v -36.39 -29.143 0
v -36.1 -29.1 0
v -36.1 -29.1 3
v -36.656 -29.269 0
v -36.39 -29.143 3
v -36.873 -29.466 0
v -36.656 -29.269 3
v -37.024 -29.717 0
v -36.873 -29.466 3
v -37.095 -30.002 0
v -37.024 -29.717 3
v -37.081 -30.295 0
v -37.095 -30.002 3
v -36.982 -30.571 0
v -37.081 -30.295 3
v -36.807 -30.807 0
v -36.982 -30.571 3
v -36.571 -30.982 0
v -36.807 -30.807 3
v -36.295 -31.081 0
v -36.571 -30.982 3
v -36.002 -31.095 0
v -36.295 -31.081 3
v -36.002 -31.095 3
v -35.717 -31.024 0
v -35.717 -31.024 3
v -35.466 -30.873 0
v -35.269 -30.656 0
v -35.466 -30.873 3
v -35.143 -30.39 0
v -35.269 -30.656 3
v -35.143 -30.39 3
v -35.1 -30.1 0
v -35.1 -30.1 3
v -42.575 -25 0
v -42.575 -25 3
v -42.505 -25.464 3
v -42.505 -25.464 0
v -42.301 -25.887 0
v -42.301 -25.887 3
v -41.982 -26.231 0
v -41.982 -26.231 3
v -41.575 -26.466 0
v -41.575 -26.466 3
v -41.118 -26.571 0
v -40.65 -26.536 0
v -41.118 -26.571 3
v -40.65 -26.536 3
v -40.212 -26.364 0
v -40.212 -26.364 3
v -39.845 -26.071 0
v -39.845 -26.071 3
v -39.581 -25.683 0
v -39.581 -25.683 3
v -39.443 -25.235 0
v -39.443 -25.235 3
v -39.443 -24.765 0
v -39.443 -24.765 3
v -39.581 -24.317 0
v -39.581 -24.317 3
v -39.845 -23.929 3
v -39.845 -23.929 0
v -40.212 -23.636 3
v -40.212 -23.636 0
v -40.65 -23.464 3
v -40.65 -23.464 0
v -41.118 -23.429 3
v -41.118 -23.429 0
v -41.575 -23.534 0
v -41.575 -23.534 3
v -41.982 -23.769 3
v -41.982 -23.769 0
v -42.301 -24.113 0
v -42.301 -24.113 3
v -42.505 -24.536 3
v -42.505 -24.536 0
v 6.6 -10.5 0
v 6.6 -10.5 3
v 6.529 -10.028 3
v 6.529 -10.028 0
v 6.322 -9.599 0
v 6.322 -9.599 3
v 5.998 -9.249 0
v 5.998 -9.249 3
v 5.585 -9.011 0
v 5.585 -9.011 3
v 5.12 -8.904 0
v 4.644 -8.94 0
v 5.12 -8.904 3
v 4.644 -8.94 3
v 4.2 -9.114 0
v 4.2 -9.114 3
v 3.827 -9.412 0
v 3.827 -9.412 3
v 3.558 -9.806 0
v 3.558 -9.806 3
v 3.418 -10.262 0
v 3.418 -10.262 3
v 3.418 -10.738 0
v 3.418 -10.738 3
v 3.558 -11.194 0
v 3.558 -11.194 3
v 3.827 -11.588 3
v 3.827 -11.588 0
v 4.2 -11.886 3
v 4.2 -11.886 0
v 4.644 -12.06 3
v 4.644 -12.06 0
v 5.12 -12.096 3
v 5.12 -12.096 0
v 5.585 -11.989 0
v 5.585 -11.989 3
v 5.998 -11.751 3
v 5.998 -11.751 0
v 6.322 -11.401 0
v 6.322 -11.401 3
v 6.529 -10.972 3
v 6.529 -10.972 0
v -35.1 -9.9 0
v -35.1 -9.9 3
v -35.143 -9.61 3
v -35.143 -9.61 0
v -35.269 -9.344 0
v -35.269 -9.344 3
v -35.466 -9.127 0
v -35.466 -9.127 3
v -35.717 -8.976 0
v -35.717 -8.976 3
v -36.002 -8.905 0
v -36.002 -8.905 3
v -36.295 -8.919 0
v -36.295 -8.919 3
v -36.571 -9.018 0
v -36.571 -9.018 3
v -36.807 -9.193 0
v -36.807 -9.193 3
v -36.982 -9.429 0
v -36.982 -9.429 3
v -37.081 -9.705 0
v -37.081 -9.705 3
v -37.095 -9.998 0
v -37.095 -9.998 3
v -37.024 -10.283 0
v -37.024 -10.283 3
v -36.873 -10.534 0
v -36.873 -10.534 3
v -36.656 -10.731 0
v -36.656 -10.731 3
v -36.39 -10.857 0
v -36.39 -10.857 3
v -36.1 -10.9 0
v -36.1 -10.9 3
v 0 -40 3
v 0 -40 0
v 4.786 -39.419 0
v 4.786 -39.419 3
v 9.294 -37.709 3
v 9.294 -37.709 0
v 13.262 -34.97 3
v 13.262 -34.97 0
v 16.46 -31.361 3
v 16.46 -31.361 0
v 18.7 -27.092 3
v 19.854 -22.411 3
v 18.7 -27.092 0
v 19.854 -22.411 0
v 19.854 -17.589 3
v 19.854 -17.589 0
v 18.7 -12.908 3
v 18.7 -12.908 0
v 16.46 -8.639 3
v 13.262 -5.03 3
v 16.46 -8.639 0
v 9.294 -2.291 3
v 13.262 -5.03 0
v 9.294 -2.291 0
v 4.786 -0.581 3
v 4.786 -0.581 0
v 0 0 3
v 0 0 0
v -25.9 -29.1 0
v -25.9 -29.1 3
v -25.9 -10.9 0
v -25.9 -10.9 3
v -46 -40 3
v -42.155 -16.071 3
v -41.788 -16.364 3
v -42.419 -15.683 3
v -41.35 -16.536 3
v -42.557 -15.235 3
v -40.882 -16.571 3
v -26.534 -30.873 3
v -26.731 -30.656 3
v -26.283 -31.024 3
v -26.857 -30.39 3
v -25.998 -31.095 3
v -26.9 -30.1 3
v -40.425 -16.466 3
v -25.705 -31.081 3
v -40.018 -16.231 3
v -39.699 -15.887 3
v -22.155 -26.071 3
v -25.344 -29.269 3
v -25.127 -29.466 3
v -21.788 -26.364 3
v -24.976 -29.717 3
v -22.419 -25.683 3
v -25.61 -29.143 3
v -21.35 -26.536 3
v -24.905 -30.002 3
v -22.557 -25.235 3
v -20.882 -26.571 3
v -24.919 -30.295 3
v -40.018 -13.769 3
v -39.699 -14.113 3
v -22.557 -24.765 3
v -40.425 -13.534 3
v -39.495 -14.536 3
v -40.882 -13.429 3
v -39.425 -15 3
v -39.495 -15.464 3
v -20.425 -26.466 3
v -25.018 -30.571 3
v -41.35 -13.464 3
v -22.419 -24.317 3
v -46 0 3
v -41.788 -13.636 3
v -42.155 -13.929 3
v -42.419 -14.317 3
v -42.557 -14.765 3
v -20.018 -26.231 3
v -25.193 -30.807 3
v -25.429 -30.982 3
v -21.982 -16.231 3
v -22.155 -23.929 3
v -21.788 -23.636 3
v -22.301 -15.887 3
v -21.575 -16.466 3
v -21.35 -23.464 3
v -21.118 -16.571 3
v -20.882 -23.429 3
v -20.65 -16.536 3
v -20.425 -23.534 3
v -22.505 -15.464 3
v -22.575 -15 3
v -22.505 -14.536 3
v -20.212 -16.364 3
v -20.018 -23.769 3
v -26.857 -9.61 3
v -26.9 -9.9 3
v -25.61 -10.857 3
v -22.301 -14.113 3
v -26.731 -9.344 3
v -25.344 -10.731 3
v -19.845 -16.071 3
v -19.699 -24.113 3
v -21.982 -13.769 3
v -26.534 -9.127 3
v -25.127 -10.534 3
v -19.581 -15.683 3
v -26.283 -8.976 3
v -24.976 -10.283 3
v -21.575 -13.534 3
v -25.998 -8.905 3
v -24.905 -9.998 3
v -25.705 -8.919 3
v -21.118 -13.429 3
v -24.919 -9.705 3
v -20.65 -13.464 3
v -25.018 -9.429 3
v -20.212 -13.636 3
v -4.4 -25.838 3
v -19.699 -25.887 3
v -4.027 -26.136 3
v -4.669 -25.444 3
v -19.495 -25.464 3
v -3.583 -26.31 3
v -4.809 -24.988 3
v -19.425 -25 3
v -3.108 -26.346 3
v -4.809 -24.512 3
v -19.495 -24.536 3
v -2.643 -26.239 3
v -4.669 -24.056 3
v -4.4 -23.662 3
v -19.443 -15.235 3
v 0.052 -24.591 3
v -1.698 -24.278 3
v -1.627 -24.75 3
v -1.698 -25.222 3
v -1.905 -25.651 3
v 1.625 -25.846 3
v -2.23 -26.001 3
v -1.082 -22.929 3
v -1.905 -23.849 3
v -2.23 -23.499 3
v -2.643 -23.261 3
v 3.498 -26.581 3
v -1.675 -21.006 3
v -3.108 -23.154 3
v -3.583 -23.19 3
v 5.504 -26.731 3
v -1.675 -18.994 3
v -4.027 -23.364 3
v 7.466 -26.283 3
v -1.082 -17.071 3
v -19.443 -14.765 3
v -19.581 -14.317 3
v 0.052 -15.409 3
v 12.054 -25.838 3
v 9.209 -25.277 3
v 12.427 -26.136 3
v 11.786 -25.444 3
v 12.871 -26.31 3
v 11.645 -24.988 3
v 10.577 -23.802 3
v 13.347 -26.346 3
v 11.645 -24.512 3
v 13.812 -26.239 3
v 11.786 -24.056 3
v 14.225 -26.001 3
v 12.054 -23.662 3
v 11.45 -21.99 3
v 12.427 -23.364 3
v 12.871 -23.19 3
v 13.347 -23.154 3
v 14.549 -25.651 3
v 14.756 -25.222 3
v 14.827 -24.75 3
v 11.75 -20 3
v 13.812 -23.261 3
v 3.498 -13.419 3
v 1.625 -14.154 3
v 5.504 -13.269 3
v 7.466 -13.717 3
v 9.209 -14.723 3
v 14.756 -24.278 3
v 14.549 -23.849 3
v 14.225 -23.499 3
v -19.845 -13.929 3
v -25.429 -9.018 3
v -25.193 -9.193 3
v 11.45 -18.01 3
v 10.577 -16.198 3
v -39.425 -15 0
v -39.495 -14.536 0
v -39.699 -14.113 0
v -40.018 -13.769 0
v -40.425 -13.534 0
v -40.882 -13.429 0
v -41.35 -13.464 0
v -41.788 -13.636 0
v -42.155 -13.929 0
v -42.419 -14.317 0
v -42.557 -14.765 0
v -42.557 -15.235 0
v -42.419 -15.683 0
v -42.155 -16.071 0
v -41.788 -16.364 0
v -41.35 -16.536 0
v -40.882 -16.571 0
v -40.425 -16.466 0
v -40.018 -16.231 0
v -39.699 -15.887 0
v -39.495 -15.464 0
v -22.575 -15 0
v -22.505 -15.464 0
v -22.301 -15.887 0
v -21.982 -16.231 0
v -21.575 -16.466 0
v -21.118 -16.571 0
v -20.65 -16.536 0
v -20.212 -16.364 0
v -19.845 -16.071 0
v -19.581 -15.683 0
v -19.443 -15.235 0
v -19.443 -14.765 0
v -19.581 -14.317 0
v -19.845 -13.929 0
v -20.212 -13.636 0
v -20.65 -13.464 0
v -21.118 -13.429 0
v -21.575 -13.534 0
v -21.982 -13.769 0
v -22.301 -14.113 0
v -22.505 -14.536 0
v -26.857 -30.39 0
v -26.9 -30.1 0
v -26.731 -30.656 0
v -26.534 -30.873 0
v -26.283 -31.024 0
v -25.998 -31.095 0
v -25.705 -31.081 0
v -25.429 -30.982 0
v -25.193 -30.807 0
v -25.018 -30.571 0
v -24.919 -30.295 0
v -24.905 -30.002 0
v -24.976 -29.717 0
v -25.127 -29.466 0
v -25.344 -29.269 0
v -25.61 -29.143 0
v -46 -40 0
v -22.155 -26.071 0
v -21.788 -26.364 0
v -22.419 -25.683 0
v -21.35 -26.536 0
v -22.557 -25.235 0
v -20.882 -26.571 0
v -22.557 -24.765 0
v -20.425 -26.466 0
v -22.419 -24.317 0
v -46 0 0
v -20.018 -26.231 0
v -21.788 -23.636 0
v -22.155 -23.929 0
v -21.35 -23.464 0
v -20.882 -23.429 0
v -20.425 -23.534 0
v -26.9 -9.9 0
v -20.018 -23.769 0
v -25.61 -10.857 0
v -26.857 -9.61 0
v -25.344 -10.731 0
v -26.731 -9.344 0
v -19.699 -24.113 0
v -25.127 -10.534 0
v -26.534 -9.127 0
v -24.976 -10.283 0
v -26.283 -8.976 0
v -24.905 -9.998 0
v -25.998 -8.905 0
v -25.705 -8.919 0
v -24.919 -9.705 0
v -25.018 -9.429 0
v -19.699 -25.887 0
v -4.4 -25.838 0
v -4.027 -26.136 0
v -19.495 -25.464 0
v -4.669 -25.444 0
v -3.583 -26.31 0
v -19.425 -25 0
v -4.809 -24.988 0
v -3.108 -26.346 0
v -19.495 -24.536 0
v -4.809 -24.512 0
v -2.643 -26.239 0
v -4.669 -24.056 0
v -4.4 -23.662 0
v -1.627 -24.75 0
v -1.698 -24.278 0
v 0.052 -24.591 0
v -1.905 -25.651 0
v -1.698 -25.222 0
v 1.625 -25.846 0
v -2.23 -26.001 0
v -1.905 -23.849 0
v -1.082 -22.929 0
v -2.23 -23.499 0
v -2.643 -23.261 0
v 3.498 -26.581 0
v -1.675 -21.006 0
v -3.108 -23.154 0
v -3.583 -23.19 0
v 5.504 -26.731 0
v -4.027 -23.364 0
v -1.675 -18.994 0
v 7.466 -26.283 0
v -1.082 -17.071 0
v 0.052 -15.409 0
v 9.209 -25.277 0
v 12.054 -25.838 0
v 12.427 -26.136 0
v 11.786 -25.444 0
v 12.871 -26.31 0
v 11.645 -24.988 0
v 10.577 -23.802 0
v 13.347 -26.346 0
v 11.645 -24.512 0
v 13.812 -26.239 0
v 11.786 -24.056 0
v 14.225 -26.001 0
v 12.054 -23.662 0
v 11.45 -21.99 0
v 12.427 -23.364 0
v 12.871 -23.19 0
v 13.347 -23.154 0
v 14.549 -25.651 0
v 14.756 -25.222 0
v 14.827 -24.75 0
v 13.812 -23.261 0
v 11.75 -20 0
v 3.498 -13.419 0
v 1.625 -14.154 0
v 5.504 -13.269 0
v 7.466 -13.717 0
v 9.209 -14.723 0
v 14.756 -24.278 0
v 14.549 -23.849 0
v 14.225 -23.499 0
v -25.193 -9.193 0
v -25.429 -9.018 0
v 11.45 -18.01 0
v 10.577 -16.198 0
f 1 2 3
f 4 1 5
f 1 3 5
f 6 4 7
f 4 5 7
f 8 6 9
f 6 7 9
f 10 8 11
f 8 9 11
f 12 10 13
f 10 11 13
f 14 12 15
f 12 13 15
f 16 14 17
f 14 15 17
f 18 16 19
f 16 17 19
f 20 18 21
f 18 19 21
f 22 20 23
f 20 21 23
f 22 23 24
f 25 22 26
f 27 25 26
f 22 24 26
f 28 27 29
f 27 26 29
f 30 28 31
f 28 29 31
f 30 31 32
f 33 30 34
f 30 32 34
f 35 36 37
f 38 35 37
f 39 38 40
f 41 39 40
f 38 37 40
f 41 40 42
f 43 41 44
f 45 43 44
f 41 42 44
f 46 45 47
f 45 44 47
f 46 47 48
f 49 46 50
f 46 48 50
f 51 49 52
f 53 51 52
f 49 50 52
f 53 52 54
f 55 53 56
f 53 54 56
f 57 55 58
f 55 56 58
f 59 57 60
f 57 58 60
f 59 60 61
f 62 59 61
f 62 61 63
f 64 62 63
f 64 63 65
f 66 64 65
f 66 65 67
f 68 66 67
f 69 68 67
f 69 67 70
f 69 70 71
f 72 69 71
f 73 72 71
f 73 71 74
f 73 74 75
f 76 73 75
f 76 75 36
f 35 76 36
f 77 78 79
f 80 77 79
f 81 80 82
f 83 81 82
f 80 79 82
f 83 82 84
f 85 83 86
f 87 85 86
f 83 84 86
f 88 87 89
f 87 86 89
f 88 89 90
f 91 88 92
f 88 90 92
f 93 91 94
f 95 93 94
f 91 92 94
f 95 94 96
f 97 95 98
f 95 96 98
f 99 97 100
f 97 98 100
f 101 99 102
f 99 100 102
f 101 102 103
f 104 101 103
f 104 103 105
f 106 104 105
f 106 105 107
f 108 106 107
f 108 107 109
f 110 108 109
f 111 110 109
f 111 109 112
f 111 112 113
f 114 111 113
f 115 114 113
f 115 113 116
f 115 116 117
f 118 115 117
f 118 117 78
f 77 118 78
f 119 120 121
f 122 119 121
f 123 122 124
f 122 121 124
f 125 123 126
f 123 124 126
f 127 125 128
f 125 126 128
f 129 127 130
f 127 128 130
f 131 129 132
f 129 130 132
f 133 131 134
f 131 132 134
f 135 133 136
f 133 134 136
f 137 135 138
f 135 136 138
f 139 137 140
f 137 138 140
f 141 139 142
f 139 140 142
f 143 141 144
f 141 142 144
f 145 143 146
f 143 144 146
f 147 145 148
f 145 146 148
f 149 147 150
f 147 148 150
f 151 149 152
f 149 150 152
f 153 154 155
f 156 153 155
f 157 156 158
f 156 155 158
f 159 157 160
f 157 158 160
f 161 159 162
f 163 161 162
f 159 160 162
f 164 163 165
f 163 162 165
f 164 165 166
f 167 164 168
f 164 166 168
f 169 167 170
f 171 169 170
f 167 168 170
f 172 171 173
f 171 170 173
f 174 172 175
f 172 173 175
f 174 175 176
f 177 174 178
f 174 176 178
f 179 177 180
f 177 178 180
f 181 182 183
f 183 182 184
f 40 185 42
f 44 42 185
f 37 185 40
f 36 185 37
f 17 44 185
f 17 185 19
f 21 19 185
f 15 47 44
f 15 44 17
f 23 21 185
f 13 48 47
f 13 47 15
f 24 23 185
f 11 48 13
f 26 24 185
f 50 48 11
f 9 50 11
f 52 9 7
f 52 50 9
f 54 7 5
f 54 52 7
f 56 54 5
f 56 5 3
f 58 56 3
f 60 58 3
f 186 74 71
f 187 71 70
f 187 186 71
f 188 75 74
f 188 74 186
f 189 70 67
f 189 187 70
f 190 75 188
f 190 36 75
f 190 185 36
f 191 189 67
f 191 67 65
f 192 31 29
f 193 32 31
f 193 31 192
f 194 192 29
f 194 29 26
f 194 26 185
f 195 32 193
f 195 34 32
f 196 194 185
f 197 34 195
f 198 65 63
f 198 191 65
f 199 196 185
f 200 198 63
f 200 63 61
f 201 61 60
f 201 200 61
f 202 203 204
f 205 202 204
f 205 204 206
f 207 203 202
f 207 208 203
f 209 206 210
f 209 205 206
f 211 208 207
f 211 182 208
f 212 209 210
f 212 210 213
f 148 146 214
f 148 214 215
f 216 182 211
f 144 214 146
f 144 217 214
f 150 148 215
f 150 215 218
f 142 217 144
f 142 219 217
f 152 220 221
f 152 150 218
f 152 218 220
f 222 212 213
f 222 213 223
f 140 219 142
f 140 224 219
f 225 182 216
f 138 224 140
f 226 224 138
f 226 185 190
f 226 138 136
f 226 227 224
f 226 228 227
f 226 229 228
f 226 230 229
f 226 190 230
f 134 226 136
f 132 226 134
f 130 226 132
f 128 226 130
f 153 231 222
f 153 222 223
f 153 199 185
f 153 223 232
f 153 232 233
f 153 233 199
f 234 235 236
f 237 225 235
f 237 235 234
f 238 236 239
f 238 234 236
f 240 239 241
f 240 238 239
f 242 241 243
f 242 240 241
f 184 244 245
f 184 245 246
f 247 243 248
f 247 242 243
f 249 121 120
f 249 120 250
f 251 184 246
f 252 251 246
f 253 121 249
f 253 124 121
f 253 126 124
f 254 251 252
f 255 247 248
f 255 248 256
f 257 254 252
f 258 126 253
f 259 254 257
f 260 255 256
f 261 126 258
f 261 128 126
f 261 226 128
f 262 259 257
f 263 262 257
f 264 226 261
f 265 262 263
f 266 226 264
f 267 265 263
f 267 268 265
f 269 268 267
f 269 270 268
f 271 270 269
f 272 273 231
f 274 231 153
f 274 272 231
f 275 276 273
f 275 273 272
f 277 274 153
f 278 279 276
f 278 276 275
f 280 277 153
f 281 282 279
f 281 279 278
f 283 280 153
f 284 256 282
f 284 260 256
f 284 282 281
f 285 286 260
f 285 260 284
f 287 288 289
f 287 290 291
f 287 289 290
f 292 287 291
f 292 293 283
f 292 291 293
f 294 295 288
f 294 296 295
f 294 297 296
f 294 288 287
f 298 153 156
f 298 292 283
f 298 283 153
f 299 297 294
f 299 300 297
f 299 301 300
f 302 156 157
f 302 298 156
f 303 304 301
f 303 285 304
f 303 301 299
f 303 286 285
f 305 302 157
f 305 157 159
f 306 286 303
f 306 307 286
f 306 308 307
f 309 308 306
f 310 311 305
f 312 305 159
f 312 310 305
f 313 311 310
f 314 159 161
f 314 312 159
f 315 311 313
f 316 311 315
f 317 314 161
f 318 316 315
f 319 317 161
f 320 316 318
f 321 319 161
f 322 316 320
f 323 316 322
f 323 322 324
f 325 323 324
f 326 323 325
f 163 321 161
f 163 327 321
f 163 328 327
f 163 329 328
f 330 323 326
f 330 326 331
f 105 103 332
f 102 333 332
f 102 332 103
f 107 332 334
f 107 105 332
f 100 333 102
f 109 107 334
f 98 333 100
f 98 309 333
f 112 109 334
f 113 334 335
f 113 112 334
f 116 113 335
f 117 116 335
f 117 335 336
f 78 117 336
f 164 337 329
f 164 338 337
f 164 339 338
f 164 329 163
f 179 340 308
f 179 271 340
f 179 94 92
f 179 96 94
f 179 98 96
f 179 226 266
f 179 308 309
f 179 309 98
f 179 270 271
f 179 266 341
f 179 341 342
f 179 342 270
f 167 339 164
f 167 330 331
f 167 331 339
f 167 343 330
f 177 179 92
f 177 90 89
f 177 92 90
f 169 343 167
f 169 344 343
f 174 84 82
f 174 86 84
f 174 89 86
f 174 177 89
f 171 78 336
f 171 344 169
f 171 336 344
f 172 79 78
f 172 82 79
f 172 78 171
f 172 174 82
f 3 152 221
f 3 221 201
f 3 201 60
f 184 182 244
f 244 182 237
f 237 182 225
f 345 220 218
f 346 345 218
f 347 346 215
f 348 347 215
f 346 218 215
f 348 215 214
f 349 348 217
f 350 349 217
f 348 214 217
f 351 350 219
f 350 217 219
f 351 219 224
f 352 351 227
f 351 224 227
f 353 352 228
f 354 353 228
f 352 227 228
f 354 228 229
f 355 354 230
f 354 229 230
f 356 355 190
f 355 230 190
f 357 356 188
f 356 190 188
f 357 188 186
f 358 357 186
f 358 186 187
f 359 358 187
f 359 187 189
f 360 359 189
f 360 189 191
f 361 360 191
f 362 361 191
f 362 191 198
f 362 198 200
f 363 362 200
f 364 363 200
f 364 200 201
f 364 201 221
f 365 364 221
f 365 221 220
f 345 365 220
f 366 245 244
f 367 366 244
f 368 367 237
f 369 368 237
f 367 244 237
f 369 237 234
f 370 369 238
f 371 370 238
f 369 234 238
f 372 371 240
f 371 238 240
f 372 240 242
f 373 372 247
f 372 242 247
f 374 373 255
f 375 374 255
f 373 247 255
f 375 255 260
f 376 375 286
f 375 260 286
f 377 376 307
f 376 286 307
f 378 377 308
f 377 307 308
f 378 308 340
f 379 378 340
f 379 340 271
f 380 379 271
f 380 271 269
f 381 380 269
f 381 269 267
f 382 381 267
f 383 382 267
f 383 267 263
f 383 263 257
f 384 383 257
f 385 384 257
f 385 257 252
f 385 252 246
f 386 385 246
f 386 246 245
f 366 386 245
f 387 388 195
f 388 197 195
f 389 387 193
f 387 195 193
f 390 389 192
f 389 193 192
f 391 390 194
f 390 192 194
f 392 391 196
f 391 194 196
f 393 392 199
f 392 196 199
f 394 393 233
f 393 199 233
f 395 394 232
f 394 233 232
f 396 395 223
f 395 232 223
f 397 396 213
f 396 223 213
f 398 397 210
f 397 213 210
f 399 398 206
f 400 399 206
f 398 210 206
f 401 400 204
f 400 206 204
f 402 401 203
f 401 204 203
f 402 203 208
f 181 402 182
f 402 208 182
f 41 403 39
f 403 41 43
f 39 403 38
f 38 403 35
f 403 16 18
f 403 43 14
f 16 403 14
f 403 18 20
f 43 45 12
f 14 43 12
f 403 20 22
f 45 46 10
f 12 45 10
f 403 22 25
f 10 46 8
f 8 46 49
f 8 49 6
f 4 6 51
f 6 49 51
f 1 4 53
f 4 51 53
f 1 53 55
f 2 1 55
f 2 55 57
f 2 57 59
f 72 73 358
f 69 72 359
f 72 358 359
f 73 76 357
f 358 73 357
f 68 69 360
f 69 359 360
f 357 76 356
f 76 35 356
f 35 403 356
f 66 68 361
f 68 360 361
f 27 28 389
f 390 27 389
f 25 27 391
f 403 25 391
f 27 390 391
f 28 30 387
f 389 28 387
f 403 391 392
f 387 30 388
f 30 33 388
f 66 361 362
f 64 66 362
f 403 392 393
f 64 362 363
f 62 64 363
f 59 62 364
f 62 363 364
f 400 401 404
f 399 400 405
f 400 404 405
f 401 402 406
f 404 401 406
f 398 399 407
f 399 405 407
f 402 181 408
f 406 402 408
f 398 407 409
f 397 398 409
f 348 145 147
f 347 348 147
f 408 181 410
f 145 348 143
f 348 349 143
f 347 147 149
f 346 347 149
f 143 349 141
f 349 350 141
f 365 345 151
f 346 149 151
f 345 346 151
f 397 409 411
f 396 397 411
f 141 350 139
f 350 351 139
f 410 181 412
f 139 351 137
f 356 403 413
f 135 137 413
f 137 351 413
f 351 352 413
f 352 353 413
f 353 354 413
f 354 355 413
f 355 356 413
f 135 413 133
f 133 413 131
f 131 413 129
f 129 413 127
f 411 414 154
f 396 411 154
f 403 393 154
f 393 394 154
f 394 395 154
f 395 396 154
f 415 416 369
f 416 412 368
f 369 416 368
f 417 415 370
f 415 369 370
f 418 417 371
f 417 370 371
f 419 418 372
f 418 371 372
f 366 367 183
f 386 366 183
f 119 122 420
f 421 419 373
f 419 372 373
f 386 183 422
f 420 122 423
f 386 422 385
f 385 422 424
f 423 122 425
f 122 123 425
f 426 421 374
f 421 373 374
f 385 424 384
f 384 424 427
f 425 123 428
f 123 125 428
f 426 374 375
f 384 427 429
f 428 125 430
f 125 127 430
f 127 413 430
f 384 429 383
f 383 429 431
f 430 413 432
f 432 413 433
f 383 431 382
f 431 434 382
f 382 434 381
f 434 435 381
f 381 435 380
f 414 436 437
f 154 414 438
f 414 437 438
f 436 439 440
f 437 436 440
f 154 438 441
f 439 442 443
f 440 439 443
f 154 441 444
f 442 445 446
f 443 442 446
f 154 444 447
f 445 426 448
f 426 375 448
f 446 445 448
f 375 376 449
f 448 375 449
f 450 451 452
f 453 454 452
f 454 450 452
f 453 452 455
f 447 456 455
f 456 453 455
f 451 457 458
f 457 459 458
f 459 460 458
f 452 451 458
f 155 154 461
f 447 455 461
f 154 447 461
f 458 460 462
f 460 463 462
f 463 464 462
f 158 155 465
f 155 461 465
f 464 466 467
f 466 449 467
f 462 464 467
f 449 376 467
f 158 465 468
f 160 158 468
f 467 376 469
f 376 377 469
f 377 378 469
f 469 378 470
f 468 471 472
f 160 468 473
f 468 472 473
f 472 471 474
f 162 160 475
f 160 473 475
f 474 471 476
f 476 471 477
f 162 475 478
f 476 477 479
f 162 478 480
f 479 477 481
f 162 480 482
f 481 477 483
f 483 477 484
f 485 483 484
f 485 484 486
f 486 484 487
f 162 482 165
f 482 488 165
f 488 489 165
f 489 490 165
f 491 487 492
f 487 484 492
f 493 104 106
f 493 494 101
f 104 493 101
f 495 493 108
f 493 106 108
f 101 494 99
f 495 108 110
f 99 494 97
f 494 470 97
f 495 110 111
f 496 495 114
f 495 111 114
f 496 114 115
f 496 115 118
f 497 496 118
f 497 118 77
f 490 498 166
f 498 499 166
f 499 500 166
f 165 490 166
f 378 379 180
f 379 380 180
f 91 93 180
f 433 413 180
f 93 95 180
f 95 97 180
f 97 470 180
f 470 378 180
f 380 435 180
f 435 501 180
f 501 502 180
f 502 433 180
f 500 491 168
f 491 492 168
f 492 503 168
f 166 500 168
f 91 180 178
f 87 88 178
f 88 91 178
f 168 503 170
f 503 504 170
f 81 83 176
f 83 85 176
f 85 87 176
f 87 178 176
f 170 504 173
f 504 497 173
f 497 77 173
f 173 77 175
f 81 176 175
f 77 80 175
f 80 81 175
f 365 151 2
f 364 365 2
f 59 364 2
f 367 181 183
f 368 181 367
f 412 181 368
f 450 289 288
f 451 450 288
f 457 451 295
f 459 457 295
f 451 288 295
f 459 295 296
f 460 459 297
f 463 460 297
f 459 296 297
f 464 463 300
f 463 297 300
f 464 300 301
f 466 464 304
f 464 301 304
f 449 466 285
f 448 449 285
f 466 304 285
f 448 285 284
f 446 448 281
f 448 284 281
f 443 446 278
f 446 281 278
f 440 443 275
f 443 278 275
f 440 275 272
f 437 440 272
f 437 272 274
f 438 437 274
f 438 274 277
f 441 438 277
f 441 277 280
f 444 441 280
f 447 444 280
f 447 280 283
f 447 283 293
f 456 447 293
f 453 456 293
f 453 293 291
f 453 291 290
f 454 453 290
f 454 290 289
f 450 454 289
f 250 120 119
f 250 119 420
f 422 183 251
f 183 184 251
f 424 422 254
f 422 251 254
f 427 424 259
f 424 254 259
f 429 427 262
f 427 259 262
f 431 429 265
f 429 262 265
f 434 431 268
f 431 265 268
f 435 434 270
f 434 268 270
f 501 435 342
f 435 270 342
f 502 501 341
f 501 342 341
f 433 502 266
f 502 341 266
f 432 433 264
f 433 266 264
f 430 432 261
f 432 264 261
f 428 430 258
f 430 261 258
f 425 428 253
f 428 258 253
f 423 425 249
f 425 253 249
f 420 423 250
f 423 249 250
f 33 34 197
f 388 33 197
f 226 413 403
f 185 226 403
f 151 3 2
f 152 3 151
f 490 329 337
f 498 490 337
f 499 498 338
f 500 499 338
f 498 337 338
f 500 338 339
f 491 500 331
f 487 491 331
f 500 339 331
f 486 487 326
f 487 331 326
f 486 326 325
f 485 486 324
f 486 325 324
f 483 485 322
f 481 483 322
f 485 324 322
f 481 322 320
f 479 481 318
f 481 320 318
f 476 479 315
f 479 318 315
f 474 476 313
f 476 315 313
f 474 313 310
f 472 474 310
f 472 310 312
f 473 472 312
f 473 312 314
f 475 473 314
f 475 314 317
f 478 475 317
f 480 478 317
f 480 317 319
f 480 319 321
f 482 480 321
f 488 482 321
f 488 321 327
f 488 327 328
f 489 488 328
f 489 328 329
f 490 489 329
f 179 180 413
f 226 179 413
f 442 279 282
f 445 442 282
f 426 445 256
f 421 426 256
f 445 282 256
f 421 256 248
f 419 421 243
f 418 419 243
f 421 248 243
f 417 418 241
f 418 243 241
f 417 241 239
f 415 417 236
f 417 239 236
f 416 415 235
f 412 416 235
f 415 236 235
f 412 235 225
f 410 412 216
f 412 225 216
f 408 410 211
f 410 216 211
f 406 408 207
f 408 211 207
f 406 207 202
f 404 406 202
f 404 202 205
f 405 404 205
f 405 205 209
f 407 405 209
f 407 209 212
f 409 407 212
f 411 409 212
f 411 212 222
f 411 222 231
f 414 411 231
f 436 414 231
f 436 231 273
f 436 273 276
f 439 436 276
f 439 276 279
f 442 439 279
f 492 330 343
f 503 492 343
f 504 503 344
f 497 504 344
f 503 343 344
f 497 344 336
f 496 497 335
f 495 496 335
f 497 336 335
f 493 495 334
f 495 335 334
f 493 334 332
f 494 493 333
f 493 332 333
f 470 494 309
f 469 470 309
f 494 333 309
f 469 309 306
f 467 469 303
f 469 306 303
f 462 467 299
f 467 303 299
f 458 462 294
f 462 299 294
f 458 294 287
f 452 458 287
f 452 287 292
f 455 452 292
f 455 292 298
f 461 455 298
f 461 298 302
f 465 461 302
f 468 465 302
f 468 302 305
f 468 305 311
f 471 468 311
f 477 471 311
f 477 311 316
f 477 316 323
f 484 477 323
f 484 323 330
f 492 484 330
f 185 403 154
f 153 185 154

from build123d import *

# Parameters (mm, degrees)
EXTRUDE_1_DEPTH     = 3
SKETCH_2_R          = 1.575
SKETCH_2_R_2        = 6.75
SKETCH_2_R_3        = 1.6
SKETCH_2_W          = 10.2
SKETCH_2_H          = 20.2
CUT_EXTRUDE_1_DEPTH = 62.032778079
SKETCH_3_R          = 1
CUT_EXTRUDE_2_DEPTH = 62.032778079


with BuildPart() as part:
    # 草图1 → 凸台-拉伸1 (new body)
    with BuildSketch(Plane.XY):
        with BuildLine():
            Line((0, 0), (-46, 0))
            Line((-46, 0), (-46, -40))
            Line((-46, -40), (0, -40))
            ThreePointArc((0, -40), (20, -20), (0, 0))
        make_face()
    extrude(amount=EXTRUDE_1_DEPTH)

    # 草图2 → 切除-拉伸1 (cut, through all)
    with BuildSketch(Plane.XY.offset(3)):
        with Locations((-41, -15)):
            Circle(SKETCH_2_R)
        with Locations(Location((-41, -25, 0), (0, 0, 180))):
            Circle(SKETCH_2_R)
        with Locations((-21, -25)):
            Circle(SKETCH_2_R)
        with Locations(Location((-21, -15, 0), (0, 0, 180))):
            Circle(SKETCH_2_R)
        with Locations((5, -20)):
            Circle(SKETCH_2_R_2)
        with Locations((5, -10.5)):
            Circle(SKETCH_2_R_3)
        with Locations((13.227241336, -24.75)):
            Circle(SKETCH_2_R_3)
        with Locations((-3.227241336, -24.75)):
            Circle(SKETCH_2_R_3)
        with Locations((-31, -20)):
            Rectangle(SKETCH_2_W, SKETCH_2_H)
    extrude(amount=-CUT_EXTRUDE_1_DEPTH, mode=Mode.SUBTRACT)

    # 草图3 → 切除-拉伸2 (cut, through all)
    with BuildSketch(Plane.XY.offset(3)):
        with Locations((-25.9, -9.9)):
            Circle(SKETCH_3_R)
        with Locations((-25.9, -30.1)):
            Circle(SKETCH_3_R)
        with Locations((-36.1, -30.1)):
            Circle(SKETCH_3_R)
        with Locations((-36.1, -9.9)):
            Circle(SKETCH_3_R)
    extrude(amount=-CUT_EXTRUDE_2_DEPTH, mode=Mode.SUBTRACT)


solid = part.part
